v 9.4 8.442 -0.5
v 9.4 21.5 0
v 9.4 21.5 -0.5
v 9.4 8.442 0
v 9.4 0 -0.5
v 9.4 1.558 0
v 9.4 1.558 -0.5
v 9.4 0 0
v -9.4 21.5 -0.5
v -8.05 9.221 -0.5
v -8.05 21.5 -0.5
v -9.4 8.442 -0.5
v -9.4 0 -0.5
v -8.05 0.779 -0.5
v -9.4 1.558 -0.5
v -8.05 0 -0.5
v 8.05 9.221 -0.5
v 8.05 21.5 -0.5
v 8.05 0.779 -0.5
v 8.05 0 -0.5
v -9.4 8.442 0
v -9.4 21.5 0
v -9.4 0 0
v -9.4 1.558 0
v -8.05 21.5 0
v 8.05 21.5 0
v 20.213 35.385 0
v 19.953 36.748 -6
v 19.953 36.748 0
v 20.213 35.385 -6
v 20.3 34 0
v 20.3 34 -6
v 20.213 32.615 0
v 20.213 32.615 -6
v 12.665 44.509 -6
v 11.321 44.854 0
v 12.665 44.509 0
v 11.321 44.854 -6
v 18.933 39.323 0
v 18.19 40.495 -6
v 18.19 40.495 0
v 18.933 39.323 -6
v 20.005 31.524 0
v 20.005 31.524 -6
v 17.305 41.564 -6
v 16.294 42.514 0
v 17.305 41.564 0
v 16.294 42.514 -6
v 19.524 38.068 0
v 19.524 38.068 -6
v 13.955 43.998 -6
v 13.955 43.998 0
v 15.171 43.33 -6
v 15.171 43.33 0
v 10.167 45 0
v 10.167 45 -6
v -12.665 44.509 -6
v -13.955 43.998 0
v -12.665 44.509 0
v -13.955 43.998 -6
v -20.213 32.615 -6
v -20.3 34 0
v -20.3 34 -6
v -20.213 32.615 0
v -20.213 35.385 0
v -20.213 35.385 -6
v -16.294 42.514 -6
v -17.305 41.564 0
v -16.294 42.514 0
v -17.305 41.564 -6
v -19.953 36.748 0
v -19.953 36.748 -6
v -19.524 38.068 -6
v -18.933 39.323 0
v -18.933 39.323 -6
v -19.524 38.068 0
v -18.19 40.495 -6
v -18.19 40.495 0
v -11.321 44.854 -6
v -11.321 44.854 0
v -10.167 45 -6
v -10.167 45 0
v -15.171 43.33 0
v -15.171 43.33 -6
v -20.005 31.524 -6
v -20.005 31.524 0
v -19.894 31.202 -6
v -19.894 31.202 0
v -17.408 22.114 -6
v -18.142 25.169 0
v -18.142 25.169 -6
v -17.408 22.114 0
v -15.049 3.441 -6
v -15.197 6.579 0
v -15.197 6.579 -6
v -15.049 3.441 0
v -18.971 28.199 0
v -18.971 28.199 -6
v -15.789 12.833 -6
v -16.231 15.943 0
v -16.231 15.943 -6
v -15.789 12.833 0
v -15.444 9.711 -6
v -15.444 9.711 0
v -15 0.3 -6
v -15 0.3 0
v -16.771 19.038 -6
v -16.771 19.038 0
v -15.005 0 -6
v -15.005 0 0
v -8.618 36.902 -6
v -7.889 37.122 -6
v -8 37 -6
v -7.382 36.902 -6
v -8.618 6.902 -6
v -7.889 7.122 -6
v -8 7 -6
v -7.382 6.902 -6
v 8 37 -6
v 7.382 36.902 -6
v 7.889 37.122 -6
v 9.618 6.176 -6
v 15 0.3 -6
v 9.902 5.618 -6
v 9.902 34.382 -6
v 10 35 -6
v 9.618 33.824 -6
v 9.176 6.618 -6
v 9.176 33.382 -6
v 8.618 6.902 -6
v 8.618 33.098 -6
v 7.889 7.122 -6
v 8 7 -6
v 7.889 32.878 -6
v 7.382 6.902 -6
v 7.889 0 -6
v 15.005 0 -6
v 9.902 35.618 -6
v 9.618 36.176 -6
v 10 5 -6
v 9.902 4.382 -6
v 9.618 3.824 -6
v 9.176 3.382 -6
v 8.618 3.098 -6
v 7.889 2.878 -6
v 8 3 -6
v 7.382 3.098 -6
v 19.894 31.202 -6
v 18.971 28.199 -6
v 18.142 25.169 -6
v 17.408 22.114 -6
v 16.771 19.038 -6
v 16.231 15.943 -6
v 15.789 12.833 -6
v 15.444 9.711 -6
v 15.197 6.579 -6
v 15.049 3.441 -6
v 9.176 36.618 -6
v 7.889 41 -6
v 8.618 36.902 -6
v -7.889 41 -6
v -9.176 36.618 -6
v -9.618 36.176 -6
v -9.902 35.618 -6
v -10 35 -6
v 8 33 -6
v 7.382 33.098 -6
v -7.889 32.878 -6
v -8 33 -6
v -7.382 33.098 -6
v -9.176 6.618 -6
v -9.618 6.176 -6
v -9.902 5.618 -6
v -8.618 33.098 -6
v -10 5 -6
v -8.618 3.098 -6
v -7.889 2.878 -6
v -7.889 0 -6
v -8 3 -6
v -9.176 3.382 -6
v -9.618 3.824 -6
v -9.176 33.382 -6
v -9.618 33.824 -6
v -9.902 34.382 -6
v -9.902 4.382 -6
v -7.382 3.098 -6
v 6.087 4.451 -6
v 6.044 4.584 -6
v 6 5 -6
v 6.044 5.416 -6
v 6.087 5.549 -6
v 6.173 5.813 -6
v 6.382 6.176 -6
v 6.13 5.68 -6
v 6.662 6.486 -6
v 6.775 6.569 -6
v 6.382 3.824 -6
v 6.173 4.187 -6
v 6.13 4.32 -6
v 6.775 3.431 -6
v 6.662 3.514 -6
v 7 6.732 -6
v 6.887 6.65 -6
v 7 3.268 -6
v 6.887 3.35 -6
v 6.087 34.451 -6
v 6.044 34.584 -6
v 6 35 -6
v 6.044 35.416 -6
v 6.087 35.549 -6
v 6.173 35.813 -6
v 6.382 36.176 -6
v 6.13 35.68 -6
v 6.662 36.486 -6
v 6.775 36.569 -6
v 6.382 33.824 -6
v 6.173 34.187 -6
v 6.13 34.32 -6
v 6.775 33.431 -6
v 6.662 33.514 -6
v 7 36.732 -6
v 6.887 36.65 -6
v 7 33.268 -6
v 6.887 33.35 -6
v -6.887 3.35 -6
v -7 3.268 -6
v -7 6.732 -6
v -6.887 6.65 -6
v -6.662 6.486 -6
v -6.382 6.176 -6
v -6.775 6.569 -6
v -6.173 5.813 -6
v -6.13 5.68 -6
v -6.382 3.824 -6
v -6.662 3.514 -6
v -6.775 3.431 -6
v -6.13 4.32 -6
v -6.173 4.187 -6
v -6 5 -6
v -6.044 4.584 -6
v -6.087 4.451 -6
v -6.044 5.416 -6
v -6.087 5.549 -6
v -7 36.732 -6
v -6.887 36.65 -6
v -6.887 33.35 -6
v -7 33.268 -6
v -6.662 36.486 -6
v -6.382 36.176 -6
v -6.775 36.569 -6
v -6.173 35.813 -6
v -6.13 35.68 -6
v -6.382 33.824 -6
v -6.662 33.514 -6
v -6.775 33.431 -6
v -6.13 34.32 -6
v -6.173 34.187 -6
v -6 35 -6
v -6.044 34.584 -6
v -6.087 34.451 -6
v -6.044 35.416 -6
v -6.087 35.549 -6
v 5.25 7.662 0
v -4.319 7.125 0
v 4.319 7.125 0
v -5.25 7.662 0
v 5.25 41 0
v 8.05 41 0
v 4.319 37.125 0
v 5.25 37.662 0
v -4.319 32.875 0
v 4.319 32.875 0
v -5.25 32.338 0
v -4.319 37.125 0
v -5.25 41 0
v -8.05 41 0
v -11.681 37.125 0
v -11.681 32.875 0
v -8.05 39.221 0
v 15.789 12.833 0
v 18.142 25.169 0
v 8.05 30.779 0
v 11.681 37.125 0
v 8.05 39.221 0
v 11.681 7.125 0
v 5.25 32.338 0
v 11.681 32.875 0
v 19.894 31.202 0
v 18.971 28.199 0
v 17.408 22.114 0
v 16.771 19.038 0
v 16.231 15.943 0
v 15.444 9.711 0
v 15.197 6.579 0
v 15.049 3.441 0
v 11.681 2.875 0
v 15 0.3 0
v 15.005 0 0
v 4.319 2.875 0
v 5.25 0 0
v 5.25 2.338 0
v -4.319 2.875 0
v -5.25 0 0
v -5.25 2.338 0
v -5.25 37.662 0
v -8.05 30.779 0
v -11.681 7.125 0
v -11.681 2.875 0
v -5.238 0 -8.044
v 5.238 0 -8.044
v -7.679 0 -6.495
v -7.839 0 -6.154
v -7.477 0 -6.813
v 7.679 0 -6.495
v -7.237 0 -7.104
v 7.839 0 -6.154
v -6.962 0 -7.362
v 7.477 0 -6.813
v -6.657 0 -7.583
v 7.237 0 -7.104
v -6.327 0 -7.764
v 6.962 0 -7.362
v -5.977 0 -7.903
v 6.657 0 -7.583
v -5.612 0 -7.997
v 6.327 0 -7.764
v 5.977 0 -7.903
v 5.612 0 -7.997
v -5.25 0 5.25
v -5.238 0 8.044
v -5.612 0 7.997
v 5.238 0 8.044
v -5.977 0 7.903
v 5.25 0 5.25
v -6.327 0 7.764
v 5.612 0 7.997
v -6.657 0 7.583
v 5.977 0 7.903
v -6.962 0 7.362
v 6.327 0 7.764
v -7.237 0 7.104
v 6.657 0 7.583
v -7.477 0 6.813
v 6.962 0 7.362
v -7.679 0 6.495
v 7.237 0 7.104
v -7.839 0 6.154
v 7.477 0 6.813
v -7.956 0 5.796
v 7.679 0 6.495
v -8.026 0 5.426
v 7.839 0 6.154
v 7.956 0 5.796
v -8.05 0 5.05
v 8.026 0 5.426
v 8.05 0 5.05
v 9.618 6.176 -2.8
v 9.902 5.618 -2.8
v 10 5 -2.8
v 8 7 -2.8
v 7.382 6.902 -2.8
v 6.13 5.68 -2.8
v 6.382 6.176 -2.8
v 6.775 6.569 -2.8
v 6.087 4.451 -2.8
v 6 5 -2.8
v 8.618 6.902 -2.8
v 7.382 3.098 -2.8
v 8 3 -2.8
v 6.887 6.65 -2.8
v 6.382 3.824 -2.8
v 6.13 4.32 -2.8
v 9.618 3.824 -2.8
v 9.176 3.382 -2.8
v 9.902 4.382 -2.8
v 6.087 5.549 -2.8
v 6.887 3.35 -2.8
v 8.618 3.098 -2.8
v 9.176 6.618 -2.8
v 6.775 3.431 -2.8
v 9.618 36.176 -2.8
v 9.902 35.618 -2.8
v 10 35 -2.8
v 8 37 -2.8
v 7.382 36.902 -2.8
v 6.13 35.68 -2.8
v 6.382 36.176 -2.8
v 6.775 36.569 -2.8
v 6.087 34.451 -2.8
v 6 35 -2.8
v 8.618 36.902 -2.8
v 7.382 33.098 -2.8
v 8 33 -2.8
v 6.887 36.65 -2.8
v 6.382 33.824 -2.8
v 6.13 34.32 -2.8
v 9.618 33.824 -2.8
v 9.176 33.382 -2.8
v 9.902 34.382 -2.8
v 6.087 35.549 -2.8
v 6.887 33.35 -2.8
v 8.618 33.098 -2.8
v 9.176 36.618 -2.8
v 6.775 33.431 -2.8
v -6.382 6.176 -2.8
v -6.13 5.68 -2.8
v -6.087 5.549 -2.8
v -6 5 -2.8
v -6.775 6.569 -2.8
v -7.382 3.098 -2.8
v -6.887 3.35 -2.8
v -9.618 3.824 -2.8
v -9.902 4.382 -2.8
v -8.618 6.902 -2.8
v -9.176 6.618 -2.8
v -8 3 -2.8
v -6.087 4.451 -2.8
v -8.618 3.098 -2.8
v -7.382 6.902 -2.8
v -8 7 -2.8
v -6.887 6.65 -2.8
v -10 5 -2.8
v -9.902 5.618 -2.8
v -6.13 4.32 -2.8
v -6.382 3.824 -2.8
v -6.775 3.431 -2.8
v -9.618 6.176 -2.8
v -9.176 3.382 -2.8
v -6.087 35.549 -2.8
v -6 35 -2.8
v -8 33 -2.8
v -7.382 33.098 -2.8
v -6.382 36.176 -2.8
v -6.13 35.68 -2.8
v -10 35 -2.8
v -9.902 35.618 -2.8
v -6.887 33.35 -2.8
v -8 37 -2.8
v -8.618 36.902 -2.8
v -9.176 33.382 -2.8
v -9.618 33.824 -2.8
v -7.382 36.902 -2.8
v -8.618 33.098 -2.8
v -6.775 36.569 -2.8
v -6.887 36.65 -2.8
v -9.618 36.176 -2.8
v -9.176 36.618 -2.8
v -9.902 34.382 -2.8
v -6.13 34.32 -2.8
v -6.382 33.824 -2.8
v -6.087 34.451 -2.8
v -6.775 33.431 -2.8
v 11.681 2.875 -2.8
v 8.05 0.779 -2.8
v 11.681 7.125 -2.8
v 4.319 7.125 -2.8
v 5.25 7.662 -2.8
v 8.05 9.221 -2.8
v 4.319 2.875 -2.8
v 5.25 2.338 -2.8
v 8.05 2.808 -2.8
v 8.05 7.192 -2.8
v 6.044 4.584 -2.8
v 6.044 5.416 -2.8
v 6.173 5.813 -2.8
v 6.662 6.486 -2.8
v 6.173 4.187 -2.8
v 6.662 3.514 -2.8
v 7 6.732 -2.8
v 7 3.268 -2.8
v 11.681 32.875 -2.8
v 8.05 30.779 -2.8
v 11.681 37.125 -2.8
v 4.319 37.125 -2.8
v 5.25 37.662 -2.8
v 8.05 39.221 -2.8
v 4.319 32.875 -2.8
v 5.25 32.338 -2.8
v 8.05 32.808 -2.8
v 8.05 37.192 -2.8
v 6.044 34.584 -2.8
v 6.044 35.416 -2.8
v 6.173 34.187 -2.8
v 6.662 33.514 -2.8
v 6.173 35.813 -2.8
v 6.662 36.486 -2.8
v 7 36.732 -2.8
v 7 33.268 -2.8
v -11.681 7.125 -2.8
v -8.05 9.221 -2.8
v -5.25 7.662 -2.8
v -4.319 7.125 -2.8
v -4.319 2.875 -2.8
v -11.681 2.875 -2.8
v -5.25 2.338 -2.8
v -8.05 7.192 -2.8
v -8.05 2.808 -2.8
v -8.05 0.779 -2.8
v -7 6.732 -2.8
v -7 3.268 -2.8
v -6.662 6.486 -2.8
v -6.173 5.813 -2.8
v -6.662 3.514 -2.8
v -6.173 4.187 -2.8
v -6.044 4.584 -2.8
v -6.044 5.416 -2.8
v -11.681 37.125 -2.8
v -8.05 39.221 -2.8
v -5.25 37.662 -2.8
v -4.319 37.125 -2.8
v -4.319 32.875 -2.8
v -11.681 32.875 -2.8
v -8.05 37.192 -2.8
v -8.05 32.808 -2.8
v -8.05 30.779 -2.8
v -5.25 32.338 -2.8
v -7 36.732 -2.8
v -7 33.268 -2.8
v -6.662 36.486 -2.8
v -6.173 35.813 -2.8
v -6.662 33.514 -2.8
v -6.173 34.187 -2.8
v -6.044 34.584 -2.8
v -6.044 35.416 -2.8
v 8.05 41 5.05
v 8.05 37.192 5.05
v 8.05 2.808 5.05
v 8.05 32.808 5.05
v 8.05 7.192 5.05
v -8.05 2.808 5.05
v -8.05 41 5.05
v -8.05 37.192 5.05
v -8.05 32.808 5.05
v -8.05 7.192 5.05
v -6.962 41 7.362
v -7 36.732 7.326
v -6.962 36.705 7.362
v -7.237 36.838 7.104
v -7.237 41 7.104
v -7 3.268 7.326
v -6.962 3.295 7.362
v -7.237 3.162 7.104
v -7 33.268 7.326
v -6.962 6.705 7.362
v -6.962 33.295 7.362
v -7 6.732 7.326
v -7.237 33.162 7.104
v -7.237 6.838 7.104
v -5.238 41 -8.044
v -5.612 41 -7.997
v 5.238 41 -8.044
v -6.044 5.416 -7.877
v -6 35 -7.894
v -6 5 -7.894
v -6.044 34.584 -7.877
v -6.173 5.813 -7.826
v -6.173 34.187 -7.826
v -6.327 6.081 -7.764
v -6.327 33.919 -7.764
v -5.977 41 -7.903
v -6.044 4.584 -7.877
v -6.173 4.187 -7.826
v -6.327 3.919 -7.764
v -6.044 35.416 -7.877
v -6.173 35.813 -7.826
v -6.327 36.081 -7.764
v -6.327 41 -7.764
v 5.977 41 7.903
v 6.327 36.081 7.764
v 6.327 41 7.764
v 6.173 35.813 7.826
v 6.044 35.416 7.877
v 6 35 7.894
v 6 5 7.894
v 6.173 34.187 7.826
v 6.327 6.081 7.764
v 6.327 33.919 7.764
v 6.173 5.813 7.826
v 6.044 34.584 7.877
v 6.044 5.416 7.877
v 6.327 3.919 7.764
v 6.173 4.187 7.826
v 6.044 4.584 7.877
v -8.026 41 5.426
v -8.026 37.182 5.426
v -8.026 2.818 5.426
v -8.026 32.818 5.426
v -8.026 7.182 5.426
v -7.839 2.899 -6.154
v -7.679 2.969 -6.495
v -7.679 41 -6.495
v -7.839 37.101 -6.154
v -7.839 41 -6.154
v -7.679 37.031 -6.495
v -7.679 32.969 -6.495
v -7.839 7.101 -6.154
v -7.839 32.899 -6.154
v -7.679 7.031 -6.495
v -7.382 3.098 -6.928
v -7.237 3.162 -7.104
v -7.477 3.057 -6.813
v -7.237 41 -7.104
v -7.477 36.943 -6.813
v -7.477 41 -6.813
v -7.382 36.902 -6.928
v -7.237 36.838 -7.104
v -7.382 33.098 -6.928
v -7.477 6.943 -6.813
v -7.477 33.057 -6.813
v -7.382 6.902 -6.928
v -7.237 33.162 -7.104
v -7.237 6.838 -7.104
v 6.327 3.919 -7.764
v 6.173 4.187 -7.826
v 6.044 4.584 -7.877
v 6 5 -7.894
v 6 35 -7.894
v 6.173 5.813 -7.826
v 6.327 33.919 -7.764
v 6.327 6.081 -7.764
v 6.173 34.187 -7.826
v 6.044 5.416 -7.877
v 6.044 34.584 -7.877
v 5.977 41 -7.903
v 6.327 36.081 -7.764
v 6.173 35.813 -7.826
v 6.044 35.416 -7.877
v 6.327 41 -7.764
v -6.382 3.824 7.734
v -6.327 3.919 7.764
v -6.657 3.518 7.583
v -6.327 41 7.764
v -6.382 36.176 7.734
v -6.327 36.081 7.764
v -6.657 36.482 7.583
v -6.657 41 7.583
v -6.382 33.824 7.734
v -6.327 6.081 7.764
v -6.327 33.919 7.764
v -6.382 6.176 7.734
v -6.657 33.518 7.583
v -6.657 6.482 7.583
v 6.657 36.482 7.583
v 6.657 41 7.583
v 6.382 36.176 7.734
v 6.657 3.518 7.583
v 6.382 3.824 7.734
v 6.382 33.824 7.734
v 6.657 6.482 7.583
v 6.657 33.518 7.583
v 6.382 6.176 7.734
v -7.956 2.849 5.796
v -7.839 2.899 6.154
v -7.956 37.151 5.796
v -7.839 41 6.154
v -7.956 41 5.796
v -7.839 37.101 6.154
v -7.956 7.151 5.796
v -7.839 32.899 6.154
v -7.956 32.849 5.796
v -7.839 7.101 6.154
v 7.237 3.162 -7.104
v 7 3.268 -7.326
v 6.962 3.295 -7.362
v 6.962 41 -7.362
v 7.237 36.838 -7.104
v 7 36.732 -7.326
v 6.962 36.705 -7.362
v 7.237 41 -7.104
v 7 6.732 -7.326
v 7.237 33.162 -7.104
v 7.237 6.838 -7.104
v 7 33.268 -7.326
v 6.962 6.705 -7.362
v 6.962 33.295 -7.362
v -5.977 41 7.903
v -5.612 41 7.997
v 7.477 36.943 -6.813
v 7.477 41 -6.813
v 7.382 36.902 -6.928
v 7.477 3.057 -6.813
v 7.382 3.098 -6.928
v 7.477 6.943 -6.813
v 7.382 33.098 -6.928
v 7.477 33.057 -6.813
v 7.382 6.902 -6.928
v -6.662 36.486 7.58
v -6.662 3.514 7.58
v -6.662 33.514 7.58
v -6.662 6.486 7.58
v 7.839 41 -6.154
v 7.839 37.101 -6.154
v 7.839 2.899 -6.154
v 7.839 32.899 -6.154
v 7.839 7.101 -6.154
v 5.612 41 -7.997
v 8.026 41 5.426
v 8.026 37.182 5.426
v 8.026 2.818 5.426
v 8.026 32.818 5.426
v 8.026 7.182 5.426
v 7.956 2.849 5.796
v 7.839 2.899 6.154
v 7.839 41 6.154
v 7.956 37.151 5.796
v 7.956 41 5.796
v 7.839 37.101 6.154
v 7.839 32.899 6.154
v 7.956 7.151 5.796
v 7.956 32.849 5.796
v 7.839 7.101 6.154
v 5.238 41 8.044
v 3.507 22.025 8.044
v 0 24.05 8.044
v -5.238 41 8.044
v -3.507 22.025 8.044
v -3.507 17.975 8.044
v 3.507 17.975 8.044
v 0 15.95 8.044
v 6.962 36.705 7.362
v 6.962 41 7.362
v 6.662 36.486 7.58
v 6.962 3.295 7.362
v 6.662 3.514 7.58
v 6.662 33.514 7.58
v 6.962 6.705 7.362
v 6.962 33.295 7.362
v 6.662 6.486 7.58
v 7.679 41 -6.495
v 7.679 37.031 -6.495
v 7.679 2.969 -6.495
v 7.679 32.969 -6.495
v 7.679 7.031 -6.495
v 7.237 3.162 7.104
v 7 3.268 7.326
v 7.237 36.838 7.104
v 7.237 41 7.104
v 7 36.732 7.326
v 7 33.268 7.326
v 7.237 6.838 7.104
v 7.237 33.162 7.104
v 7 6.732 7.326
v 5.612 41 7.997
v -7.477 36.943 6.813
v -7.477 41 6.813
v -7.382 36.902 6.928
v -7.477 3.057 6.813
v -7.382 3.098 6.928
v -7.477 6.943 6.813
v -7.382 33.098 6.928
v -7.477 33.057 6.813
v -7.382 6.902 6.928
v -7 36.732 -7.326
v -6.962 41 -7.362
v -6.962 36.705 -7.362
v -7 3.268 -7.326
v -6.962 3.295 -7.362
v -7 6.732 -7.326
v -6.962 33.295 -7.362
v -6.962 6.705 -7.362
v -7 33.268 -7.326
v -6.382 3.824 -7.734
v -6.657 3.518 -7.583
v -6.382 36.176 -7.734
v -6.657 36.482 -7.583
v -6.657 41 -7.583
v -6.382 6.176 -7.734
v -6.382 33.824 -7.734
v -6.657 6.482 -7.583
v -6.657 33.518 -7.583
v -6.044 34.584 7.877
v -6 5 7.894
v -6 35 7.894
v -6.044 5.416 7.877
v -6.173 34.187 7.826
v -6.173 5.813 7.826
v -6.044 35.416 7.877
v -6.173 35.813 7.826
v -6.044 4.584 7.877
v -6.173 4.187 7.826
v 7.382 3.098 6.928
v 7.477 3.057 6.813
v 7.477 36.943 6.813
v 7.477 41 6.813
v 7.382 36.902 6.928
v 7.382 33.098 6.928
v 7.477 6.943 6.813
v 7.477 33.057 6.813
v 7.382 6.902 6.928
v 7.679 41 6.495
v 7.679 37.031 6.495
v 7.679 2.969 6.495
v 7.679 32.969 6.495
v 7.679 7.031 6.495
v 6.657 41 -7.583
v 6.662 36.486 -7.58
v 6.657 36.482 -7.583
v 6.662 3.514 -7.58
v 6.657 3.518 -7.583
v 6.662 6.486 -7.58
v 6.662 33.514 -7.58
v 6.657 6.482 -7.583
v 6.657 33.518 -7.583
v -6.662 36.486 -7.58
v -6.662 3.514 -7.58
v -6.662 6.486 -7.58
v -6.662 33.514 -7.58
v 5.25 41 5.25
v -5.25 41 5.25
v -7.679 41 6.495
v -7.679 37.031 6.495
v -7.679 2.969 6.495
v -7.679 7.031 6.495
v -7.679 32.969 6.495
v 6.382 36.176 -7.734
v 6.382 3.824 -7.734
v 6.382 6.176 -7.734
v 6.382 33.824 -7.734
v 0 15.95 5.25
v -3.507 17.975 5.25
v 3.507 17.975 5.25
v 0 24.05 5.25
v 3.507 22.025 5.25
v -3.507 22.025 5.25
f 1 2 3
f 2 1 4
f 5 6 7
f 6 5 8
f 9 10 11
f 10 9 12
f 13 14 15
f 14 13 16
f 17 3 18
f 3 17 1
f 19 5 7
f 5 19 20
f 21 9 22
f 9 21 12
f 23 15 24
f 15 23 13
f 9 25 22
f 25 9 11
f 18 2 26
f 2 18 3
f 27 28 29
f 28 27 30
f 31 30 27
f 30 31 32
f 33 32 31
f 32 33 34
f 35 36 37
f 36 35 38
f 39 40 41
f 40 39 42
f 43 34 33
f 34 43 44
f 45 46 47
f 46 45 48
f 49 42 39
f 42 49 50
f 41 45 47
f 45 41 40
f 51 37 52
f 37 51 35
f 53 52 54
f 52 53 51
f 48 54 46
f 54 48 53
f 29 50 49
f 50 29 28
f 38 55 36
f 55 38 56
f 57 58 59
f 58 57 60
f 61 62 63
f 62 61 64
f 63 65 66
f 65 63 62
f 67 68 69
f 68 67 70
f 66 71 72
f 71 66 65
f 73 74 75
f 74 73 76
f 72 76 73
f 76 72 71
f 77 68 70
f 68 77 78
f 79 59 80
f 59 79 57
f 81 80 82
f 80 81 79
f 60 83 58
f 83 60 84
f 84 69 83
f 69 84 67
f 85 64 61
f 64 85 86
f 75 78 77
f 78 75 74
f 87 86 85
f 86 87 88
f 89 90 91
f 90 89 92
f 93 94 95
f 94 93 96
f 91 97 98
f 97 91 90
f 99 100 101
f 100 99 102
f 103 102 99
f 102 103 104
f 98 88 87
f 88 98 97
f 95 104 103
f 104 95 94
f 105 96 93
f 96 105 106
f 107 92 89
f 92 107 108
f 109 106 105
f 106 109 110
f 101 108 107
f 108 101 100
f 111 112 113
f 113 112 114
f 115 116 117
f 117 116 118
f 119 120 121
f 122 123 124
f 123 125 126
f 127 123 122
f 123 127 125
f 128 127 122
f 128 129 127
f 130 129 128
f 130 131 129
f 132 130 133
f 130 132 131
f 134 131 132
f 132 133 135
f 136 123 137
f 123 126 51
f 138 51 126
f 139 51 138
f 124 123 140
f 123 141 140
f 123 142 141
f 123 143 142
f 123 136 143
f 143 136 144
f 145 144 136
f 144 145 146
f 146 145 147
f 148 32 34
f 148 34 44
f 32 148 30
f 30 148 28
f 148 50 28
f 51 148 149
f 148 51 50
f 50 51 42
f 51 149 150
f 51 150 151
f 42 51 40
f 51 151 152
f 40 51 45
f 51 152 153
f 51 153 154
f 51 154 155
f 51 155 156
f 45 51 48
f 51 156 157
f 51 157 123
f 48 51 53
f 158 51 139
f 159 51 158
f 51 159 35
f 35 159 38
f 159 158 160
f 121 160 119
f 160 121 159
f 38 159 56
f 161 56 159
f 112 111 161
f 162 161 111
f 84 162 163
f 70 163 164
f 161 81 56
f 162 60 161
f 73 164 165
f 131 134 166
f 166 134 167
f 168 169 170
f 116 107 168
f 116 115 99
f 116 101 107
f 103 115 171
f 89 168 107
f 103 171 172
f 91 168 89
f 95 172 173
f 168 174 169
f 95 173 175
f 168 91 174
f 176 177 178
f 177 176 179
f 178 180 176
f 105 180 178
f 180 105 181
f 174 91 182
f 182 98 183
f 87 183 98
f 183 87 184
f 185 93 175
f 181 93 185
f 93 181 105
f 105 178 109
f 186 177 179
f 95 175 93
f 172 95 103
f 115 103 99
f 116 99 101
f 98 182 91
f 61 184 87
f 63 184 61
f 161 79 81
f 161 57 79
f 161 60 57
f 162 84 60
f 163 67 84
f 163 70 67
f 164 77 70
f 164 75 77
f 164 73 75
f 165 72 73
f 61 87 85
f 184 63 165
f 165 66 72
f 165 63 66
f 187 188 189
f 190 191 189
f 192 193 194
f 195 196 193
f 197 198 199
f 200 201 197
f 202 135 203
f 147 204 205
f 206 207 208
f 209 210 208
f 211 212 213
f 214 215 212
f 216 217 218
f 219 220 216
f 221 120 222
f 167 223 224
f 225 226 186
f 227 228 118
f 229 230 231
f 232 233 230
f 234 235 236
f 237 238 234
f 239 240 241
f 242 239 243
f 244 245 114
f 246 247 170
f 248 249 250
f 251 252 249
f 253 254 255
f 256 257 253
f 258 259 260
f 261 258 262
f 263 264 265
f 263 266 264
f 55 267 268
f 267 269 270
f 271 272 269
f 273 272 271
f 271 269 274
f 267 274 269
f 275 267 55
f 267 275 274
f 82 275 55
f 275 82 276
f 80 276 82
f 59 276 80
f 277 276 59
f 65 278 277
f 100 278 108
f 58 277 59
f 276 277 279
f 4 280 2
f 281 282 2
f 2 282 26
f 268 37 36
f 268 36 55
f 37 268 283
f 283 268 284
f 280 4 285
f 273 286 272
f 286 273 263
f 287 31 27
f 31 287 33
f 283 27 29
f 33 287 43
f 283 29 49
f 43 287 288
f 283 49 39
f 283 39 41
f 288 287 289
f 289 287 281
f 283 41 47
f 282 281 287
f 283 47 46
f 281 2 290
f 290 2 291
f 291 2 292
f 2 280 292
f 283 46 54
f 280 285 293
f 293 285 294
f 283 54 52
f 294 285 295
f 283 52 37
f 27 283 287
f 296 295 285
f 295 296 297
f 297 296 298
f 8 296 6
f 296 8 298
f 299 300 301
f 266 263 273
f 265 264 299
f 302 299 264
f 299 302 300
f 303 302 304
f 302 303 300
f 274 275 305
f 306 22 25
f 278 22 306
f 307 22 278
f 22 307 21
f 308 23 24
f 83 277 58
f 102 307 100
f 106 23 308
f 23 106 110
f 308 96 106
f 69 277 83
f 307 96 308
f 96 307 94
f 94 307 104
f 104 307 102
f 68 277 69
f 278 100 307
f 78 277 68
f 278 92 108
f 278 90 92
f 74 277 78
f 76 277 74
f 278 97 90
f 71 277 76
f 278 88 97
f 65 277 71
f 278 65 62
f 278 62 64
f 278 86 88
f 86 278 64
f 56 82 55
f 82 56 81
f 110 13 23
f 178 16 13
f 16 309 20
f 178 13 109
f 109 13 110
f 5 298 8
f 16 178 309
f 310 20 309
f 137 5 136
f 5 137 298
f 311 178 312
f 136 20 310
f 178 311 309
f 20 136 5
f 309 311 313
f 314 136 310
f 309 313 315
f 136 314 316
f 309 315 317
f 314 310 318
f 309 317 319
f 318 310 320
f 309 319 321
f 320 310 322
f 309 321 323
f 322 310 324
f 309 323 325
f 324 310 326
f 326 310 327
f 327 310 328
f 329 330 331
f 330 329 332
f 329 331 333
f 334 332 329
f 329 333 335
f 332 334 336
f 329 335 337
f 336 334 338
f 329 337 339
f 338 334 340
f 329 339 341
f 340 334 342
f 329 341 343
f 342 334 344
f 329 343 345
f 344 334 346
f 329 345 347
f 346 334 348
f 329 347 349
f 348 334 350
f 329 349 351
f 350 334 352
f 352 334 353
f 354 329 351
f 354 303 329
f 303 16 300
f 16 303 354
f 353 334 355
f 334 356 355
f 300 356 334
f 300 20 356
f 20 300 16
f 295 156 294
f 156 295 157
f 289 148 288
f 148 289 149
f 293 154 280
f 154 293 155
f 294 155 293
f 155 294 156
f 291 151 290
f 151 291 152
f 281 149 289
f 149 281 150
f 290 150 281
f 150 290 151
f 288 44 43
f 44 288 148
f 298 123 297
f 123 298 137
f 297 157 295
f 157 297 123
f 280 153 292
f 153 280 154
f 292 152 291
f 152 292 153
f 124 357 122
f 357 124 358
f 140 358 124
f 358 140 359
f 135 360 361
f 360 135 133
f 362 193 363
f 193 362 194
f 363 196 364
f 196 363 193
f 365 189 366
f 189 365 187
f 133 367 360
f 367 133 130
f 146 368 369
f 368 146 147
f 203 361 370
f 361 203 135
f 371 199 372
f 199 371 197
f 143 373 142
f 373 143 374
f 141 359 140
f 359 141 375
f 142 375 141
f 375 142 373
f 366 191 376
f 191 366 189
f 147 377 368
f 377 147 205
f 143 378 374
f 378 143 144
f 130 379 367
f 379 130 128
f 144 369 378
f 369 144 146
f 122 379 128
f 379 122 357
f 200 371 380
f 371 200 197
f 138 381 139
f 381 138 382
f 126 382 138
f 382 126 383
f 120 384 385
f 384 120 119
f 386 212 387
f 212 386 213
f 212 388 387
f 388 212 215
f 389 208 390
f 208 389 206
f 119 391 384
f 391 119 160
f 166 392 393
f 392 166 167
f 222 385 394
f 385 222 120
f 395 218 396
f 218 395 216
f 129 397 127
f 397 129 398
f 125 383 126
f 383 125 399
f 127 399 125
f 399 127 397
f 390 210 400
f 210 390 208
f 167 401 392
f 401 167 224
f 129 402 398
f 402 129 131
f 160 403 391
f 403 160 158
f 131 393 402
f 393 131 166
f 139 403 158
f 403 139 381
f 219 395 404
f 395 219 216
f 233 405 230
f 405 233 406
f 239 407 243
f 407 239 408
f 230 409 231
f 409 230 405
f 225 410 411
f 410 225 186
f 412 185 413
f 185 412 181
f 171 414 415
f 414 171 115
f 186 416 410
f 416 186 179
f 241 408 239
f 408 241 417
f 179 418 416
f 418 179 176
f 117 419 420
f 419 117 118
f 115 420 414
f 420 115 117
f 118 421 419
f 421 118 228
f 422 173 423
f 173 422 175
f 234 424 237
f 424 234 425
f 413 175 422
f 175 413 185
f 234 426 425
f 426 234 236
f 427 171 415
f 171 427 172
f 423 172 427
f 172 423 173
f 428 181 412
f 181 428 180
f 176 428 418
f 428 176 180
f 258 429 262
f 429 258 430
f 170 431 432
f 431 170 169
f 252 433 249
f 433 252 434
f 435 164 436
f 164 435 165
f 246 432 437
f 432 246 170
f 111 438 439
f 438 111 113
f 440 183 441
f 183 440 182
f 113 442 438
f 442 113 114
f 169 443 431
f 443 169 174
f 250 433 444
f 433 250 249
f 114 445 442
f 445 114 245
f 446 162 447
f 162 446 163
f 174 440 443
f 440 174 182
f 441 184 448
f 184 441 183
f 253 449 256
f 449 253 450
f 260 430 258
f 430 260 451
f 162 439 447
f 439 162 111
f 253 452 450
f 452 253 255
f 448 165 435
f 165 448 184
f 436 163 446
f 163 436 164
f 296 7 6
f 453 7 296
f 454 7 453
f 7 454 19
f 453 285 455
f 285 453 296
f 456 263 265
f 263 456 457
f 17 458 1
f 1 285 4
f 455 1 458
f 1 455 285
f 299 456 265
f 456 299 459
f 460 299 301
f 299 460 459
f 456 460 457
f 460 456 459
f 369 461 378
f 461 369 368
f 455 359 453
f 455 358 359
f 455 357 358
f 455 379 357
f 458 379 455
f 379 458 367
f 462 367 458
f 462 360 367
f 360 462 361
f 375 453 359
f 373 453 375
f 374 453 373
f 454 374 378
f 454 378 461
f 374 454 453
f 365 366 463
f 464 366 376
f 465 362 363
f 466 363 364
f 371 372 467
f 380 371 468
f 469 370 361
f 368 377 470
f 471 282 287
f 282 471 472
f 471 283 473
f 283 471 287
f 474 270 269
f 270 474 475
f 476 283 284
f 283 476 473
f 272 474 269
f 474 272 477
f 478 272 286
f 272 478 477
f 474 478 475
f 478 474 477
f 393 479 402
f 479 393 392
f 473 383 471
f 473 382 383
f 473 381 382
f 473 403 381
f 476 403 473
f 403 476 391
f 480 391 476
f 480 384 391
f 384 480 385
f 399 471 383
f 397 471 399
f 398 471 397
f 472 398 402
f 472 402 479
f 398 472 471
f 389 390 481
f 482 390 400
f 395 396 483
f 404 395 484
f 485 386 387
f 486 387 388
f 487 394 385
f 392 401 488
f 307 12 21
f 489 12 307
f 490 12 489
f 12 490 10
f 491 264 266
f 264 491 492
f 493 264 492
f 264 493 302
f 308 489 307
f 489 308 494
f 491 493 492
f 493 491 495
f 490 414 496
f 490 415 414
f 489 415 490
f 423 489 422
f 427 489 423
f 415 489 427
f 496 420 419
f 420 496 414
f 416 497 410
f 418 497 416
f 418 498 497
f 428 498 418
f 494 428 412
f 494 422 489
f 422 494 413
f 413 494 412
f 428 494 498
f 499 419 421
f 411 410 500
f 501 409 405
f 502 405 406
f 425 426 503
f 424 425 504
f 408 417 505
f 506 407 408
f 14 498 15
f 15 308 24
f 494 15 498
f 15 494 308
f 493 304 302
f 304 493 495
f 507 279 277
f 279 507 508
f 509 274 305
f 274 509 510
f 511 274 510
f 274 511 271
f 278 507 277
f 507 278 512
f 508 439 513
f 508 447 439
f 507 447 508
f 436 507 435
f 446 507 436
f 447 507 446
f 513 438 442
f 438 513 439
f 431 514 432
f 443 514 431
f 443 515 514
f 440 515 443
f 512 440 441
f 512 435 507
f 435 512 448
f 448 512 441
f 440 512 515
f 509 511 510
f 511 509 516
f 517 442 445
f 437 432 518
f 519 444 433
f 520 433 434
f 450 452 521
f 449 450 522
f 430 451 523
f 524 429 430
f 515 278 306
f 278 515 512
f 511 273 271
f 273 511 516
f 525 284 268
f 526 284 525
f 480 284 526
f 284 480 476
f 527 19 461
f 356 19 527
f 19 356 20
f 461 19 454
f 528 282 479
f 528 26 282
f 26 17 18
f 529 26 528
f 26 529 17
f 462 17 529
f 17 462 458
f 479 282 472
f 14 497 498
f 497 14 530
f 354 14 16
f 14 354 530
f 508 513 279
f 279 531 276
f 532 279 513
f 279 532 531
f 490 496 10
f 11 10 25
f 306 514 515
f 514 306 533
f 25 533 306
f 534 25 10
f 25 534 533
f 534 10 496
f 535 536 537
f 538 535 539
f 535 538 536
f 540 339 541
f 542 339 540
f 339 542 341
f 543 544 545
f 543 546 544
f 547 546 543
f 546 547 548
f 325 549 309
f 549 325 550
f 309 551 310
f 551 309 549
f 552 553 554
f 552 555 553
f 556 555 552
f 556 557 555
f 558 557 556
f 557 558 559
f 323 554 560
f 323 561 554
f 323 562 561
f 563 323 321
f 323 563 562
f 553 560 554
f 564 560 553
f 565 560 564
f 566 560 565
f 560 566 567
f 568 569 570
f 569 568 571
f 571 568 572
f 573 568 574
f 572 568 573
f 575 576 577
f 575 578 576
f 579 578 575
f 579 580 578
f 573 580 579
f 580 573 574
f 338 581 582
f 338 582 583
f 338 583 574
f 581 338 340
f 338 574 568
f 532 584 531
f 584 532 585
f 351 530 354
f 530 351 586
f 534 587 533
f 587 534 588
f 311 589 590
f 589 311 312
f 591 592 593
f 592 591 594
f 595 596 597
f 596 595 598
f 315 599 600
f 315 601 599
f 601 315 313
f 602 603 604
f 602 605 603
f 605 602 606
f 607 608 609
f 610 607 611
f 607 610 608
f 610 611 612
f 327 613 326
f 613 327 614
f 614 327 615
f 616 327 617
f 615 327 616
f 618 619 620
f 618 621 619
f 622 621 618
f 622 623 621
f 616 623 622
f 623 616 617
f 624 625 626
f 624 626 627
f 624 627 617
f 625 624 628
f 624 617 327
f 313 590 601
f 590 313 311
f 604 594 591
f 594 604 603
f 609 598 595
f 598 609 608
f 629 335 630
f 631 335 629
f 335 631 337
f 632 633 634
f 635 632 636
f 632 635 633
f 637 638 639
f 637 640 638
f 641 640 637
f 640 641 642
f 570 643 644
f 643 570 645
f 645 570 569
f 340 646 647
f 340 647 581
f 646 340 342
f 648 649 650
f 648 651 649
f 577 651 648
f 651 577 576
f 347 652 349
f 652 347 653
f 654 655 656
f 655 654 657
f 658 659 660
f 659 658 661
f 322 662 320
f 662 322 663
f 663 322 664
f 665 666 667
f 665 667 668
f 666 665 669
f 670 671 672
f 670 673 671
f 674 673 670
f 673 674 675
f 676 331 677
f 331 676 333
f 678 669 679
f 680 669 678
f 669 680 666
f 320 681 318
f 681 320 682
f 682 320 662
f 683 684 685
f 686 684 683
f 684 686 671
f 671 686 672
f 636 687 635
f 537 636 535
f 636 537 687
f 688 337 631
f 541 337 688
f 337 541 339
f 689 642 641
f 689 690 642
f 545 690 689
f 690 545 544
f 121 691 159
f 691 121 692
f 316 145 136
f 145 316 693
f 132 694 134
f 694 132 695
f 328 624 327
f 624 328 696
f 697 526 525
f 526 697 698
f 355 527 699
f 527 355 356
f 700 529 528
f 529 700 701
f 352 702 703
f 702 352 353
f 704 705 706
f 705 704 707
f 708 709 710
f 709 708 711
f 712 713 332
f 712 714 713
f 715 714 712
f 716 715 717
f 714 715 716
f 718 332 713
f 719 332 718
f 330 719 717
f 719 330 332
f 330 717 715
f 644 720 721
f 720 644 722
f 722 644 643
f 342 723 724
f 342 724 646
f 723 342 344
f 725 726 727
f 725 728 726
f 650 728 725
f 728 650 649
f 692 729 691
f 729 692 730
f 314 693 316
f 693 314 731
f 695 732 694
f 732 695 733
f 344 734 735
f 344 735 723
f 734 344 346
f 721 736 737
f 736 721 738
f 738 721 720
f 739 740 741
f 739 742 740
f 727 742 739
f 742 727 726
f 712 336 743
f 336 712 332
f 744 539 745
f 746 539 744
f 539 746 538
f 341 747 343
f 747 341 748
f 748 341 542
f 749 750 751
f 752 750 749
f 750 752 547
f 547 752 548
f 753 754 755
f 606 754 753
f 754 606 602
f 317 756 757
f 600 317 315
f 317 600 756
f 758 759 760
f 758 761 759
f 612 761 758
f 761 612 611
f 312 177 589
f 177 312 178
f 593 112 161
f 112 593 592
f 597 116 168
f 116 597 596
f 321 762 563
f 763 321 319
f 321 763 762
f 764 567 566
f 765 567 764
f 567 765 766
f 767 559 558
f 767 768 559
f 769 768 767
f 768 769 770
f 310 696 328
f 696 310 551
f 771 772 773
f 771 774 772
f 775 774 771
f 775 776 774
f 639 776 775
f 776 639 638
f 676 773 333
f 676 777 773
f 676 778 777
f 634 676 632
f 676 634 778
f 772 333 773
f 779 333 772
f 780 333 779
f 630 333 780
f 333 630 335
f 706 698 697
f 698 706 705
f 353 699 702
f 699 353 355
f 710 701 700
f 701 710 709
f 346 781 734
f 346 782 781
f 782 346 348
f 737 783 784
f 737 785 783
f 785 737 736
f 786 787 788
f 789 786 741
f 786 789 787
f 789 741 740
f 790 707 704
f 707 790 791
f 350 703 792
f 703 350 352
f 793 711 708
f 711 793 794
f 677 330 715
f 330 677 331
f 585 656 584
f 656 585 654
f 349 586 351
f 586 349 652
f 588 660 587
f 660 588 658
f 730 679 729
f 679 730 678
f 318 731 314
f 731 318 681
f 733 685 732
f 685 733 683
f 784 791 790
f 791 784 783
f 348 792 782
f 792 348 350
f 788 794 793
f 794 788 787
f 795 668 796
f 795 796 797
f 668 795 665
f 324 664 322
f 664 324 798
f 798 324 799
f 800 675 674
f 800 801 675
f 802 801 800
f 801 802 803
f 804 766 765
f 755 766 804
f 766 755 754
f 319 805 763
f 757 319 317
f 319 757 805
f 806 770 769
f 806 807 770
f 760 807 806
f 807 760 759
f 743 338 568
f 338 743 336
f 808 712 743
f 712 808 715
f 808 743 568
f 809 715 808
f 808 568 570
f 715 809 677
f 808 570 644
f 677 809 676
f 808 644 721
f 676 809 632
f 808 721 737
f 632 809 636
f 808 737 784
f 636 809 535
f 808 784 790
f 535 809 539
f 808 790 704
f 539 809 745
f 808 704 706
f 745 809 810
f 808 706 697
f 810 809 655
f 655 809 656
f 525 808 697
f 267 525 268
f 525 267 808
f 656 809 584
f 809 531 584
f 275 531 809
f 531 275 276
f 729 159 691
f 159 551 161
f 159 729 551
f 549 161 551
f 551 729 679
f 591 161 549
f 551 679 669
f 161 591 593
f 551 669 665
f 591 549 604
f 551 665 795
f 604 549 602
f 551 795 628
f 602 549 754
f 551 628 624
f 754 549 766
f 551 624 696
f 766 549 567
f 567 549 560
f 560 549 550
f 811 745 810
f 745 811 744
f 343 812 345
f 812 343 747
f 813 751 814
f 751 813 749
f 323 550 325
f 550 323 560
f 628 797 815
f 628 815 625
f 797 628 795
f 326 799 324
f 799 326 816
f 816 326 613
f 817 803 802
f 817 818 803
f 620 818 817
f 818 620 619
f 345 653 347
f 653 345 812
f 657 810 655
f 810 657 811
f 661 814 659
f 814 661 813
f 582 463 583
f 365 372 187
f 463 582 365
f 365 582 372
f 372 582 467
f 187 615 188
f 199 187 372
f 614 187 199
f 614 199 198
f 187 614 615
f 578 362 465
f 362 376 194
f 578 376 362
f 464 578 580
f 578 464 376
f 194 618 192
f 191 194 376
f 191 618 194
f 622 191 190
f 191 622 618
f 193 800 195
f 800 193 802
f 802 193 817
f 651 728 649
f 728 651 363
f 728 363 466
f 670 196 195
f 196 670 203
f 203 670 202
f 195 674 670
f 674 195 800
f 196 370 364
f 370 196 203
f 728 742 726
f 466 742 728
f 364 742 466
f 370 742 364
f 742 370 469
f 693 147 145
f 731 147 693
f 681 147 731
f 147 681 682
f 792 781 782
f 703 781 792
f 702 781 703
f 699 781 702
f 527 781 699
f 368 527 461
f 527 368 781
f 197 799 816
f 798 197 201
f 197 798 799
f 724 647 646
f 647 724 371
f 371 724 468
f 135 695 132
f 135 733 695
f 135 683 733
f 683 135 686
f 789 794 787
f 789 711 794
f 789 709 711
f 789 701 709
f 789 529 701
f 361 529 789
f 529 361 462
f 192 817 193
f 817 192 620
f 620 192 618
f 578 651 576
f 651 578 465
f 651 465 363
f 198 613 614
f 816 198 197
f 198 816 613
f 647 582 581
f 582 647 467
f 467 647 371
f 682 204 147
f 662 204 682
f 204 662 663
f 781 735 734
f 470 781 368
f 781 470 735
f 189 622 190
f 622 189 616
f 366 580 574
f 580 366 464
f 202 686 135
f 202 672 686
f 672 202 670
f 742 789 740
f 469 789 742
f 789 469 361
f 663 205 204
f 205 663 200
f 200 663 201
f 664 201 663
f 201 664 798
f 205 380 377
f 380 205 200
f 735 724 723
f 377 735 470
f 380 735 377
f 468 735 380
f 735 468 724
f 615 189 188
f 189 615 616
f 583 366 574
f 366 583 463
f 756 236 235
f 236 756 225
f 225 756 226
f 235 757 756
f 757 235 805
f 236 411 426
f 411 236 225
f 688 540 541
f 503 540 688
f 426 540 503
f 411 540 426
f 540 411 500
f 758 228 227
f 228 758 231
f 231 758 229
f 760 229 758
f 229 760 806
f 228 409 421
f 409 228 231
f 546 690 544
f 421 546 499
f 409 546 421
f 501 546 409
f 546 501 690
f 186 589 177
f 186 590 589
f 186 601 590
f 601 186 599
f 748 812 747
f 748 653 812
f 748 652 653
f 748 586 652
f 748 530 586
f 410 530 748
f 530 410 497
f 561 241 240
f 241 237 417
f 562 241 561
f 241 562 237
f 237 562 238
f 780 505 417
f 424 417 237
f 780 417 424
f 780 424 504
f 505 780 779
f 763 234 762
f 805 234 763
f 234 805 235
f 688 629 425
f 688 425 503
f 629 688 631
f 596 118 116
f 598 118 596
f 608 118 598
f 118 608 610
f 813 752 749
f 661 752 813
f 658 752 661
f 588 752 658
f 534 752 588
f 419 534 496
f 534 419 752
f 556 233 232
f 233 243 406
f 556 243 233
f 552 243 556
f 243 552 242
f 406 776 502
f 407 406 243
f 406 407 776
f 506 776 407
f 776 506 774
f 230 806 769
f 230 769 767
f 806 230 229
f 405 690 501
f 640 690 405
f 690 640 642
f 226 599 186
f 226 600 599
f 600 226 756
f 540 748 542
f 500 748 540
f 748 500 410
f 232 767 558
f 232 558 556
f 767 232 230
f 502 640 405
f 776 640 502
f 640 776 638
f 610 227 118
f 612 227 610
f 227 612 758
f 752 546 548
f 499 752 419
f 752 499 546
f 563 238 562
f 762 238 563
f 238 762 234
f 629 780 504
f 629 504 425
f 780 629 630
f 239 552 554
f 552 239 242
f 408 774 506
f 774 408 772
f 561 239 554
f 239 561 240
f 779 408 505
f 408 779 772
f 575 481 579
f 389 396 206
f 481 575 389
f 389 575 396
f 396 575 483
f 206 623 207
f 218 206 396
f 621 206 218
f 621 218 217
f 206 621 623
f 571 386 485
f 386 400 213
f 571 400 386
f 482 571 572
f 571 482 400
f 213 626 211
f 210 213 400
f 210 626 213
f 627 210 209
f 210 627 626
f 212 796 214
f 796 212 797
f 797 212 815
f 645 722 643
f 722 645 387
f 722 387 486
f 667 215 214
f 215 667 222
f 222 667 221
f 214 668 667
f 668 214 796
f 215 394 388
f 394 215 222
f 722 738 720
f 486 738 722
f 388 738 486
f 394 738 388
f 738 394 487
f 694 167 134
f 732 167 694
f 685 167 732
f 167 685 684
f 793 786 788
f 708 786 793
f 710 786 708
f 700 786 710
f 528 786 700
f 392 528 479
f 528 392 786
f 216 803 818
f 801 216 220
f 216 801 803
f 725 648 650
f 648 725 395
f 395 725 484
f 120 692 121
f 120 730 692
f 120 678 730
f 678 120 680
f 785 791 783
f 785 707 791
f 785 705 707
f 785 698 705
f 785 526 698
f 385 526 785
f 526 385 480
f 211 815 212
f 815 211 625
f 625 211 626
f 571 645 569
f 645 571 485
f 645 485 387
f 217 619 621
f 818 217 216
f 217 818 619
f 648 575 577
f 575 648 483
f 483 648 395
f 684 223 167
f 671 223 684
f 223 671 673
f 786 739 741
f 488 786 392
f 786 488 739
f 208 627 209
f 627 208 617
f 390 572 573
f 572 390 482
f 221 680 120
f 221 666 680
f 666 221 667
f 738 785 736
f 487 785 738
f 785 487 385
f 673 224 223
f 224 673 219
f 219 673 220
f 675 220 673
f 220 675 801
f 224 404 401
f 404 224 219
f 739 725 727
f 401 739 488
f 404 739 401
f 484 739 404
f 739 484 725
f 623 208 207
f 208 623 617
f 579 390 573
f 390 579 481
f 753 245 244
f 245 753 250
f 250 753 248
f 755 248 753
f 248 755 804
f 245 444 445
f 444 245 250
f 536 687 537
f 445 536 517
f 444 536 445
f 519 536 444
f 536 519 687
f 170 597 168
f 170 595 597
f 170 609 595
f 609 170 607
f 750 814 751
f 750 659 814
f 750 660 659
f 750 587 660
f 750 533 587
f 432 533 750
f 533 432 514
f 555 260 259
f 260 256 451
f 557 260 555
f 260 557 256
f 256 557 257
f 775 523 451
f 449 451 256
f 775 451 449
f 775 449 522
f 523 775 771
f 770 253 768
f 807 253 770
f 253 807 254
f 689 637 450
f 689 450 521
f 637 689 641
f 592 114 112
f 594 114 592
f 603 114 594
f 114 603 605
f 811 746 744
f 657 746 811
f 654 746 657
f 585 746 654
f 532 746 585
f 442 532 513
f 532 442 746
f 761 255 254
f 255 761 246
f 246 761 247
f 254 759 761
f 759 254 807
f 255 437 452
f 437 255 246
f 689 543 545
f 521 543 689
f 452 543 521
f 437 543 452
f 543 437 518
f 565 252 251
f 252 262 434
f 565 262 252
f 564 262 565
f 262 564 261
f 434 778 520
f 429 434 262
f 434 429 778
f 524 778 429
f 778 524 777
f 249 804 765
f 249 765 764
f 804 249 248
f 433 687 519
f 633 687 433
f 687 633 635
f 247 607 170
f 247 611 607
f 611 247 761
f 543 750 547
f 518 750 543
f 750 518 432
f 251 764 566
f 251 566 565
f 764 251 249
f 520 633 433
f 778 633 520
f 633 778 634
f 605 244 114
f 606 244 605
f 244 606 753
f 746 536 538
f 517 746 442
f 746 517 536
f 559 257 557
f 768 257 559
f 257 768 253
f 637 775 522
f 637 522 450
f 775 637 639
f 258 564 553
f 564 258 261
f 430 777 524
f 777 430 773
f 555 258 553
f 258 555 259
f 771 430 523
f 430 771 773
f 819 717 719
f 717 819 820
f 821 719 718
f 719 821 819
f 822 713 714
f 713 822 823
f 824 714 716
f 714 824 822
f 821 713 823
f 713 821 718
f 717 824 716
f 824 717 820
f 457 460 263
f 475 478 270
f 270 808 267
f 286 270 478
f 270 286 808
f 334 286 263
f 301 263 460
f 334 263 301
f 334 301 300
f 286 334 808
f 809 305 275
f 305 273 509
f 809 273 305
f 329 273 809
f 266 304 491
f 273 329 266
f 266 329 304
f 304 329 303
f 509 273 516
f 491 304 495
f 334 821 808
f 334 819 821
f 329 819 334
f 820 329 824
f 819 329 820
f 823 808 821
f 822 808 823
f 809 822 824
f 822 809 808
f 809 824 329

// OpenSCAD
// file: tube.scad
$fn = 50;


module tube(height, width, fillet, hole){
	if(hole>0){
		difference(){
			translate([fillet-width/2,fillet-width/2,0]){
				minkowski(){
					cube([width-fillet*2,width-fillet*2,height]);
					cylinder(r=fillet,h=1);
				}
			}
			translate([width/2,width/2,-.5])
			cylinder(h=height+2,r=hole); 
		}
	} else {
	translate([fillet-width/2,fillet-width/2,0]){
		minkowski(){
			cube([width-fillet*2,width-fillet*2,height]);
			cylinder(r=fillet,h=1);
		}
	}
}
}



tube(20,20,3,0);
// file: Configuration.scad
in = 25.4;
tubeInWidth = 10.5;
tubeWall = 2.8;
tubeOutWidth = tubeInWidth+2*tubeWall;

boltHead = 8.5; 
boltR = 2;

filletRad = 5;

module fillet(){
	difference(){
		translate([0,0,-.5]) cube([filletRad+2,filletRad+2,height+1]);
		translate([0,0,-1])cylinder(r=filletRad, h=height+2, $fn=60);
	}
}

	plugWidth = 15.8;
	plugHeight = 8.8;
	plugDepth = 20.2;
	wall = 1.5;
	hole = 1.5;
// file: TricopterTail.scad
include <Configuration.scad>;
use <tube.scad>;

module tail(){
	
	length = 40;
	
	boltHousingRadius = 4;
	boltHousingTube = tubeOutWidth;
	boltHousingScale = 1.3;
	housingDistance = 4;
	
	boltVirtOffset	= 15;
	boltOffsetWidth	= 8;
	boltOffsetLength = tubeOutWidth/2;
	boltScale = 2;
	boltDistance = 5;

	difference(){
		union(){
			tube(length,tubeOutWidth,3,0); // outer

			intersection(){
				tube(length+4,boltHousingTube,4,0); // Bolt Cutter
				union(){
					translate([boltOffsetWidth,boltOffsetLength,length/2-boltVirtOffset]) rotate([90,0,0]) bolt(boltHousingRadius,tubeOutWidth-1,boltHousingScale,housingDistance);
					translate([-1*boltOffsetWidth,boltOffsetLength,length/2-boltVirtOffset]) rotate([90,180,0]) bolt(boltHousingRadius,tubeOutWidth-1,boltHousingScale,housingDistance);
					translate([boltOffsetWidth,boltOffsetLength,length/2+boltVirtOffset]) rotate([90,0,0]) bolt(boltHousingRadius,tubeOutWidth-1,boltHousingScale,housingDistance);
					translate([-1*boltOffsetWidth,boltOffsetLength,length/2+boltVirtOffset]) rotate([90,180,0]) bolt(boltHousingRadius,tubeOutWidth-1,boltHousingScale,housingDistance);
				}
			}
		}
		translate([boltOffsetWidth,boltOffsetLength+.5,length/2-boltVirtOffset]) rotate([90,0,0]) bolt(boltR,tubeOutWidth,boltScale,boltDistance);
		translate([-1*boltOffsetWidth,boltOffsetLength+.5,length/2-boltVirtOffset]) rotate([90,180,0]) bolt(boltR,tubeOutWidth,boltScale,boltDistance);
		translate([boltOffsetWidth,boltOffsetLength+.5,length/2+boltVirtOffset]) rotate([90,0,0]) bolt(boltR,tubeOutWidth,boltScale,boltDistance);
		translate([-1*boltOffsetWidth,boltOffsetLength+.5,length/2+boltVirtOffset]) rotate([90,180,0]) bolt(boltR,tubeOutWidth,boltScale,boltDistance);
		translate([0,0,length/2]) rotate([90,30,0]) cylinder(r=boltHead/2-.2, h=tubeOutWidth, $fn=6);

		translate([0,0,length/2+.5])cube([tubeInWidth,tubeInWidth,length+4], center=true); // inner tube
	}
}

module bolt(radius,height,scale,distance){
	hull(){
		cylinder(r=radius,h=height+1,$fn=30);
		translate([distance,0,0])cylinder(r=radius*scale,h=height+1,$fn=30);
	}
}

tail();
// file: CameraRearMount.scad
include <Configuration.scad>

module rear(){
	cubew = 50;
	cubed = 45;
	rad=100;
	fillet = 11;
	width = 40;
	height = 6;
	boltOffset=5;
	boltWidth = 8;
	boltHeight = 15;

	
	mirror([0,0,1]){
	difference(){

			translate([-cubew/2,0,0])cube([cubew,cubed,height]);
			translate([0,-.2,.5]){
				difference(){
					translate([-(plugWidth+2*wall)/2,0,-plugHeight-wall])cube([plugWidth+(2*wall),plugDepth+wall,plugHeight+wall]);
					translate([-plugWidth/2,-.2,-plugHeight])cube([plugWidth,plugDepth+.2,plugHeight+.2]);
					translate([-(plugWidth-2*hole)/2,5,-plugHeight+hole])cube([plugWidth-(2*hole),plugDepth-hole,plugHeight-hole+.2]);
				}
			}


		translate([rad+15,.3,-1])cylinder(r=rad, h=10, $fn=200);
		difference(){
			translate([9.25,cubed-fillet-2.5,-.5])cube([20,20,8]);
			translate([9.25,cubed-fillet,-1])cylinder(r=fillet+.05,h =10,$fn=50);
		}

		mirror(1,0,0){
			translate([rad+15,.3,-1])cylinder(r=rad, h=10, $fn=200);
			difference(){
				translate([9.25,cubed-fillet-2.5,-.5])cube([20,20,8]);
				translate([9.25,cubed-fillet,-1])cylinder(r=fillet+.05,h =10,$fn=50);
			}
		}


		//WireChannels
		translate([0,6.5,4]){
			translate([width/2-11,4,height/2])	difference(){
				cube([11.5,19,4]);
				translate([2,-.5,-0.5])cube([10,17.5,5]);
			}
			mirror([1,0,0])	translate([width/2-11,4,height/2])
			difference(){
				cube([11.5,19,4]);
				translate([2,-.5,-0.5])cube([10,17.5,5]);
			}
		}
		
		//bolts
		translate([boltWidth,boltOffset,-.5])cylinder(r=2,h=12, $fn=20);
		translate([boltWidth,boltOffset+30,-.5])cylinder(r=2,h=12, $fn=20);
		translate([-boltWidth,boltOffset,-.5])cylinder(r=2,h=12, $fn=20);
		translate([-boltWidth,boltOffset+30,-.5])cylinder(r=2,h=12, $fn=20);
		//boltHead
		translate([boltWidth,boltOffset,-.2])rotate([0,0,30])cylinder(r=boltHead/2,h=3, $fn=6);
		translate([boltWidth,boltOffset+30,-.2])rotate([0,0,30])cylinder(r=boltHead/2,h=3, $fn=6);
		translate([-boltWidth,boltOffset,-.2])rotate([0,0,30])cylinder(r=boltHead/2,h=3, $fn=6);
		translate([-boltWidth,boltOffset+30,-.2])rotate([0,0,30])cylinder(r=boltHead/2,h=3, $fn=6);
	}
}
}

rear();

/*
	//WireChannels
	translate([width/2-11,4,height/2])	difference(){
	cube([11.5,19,4]);
	translate([2,-.5,-0.5])cube([10,17.5,5]);
	}
	mirror([1,0,0])	translate([width/2-11,4,height/2])
	difference(){
	cube([11.5,19,4]);
	translate([2,-.5,-0.5])cube([10,17.5,5]);
	}
	*/
// main file
use <CameraRearMount.scad>
use <TricopterTail.scad>

rear();
rotate([-90,0,0])tail();
